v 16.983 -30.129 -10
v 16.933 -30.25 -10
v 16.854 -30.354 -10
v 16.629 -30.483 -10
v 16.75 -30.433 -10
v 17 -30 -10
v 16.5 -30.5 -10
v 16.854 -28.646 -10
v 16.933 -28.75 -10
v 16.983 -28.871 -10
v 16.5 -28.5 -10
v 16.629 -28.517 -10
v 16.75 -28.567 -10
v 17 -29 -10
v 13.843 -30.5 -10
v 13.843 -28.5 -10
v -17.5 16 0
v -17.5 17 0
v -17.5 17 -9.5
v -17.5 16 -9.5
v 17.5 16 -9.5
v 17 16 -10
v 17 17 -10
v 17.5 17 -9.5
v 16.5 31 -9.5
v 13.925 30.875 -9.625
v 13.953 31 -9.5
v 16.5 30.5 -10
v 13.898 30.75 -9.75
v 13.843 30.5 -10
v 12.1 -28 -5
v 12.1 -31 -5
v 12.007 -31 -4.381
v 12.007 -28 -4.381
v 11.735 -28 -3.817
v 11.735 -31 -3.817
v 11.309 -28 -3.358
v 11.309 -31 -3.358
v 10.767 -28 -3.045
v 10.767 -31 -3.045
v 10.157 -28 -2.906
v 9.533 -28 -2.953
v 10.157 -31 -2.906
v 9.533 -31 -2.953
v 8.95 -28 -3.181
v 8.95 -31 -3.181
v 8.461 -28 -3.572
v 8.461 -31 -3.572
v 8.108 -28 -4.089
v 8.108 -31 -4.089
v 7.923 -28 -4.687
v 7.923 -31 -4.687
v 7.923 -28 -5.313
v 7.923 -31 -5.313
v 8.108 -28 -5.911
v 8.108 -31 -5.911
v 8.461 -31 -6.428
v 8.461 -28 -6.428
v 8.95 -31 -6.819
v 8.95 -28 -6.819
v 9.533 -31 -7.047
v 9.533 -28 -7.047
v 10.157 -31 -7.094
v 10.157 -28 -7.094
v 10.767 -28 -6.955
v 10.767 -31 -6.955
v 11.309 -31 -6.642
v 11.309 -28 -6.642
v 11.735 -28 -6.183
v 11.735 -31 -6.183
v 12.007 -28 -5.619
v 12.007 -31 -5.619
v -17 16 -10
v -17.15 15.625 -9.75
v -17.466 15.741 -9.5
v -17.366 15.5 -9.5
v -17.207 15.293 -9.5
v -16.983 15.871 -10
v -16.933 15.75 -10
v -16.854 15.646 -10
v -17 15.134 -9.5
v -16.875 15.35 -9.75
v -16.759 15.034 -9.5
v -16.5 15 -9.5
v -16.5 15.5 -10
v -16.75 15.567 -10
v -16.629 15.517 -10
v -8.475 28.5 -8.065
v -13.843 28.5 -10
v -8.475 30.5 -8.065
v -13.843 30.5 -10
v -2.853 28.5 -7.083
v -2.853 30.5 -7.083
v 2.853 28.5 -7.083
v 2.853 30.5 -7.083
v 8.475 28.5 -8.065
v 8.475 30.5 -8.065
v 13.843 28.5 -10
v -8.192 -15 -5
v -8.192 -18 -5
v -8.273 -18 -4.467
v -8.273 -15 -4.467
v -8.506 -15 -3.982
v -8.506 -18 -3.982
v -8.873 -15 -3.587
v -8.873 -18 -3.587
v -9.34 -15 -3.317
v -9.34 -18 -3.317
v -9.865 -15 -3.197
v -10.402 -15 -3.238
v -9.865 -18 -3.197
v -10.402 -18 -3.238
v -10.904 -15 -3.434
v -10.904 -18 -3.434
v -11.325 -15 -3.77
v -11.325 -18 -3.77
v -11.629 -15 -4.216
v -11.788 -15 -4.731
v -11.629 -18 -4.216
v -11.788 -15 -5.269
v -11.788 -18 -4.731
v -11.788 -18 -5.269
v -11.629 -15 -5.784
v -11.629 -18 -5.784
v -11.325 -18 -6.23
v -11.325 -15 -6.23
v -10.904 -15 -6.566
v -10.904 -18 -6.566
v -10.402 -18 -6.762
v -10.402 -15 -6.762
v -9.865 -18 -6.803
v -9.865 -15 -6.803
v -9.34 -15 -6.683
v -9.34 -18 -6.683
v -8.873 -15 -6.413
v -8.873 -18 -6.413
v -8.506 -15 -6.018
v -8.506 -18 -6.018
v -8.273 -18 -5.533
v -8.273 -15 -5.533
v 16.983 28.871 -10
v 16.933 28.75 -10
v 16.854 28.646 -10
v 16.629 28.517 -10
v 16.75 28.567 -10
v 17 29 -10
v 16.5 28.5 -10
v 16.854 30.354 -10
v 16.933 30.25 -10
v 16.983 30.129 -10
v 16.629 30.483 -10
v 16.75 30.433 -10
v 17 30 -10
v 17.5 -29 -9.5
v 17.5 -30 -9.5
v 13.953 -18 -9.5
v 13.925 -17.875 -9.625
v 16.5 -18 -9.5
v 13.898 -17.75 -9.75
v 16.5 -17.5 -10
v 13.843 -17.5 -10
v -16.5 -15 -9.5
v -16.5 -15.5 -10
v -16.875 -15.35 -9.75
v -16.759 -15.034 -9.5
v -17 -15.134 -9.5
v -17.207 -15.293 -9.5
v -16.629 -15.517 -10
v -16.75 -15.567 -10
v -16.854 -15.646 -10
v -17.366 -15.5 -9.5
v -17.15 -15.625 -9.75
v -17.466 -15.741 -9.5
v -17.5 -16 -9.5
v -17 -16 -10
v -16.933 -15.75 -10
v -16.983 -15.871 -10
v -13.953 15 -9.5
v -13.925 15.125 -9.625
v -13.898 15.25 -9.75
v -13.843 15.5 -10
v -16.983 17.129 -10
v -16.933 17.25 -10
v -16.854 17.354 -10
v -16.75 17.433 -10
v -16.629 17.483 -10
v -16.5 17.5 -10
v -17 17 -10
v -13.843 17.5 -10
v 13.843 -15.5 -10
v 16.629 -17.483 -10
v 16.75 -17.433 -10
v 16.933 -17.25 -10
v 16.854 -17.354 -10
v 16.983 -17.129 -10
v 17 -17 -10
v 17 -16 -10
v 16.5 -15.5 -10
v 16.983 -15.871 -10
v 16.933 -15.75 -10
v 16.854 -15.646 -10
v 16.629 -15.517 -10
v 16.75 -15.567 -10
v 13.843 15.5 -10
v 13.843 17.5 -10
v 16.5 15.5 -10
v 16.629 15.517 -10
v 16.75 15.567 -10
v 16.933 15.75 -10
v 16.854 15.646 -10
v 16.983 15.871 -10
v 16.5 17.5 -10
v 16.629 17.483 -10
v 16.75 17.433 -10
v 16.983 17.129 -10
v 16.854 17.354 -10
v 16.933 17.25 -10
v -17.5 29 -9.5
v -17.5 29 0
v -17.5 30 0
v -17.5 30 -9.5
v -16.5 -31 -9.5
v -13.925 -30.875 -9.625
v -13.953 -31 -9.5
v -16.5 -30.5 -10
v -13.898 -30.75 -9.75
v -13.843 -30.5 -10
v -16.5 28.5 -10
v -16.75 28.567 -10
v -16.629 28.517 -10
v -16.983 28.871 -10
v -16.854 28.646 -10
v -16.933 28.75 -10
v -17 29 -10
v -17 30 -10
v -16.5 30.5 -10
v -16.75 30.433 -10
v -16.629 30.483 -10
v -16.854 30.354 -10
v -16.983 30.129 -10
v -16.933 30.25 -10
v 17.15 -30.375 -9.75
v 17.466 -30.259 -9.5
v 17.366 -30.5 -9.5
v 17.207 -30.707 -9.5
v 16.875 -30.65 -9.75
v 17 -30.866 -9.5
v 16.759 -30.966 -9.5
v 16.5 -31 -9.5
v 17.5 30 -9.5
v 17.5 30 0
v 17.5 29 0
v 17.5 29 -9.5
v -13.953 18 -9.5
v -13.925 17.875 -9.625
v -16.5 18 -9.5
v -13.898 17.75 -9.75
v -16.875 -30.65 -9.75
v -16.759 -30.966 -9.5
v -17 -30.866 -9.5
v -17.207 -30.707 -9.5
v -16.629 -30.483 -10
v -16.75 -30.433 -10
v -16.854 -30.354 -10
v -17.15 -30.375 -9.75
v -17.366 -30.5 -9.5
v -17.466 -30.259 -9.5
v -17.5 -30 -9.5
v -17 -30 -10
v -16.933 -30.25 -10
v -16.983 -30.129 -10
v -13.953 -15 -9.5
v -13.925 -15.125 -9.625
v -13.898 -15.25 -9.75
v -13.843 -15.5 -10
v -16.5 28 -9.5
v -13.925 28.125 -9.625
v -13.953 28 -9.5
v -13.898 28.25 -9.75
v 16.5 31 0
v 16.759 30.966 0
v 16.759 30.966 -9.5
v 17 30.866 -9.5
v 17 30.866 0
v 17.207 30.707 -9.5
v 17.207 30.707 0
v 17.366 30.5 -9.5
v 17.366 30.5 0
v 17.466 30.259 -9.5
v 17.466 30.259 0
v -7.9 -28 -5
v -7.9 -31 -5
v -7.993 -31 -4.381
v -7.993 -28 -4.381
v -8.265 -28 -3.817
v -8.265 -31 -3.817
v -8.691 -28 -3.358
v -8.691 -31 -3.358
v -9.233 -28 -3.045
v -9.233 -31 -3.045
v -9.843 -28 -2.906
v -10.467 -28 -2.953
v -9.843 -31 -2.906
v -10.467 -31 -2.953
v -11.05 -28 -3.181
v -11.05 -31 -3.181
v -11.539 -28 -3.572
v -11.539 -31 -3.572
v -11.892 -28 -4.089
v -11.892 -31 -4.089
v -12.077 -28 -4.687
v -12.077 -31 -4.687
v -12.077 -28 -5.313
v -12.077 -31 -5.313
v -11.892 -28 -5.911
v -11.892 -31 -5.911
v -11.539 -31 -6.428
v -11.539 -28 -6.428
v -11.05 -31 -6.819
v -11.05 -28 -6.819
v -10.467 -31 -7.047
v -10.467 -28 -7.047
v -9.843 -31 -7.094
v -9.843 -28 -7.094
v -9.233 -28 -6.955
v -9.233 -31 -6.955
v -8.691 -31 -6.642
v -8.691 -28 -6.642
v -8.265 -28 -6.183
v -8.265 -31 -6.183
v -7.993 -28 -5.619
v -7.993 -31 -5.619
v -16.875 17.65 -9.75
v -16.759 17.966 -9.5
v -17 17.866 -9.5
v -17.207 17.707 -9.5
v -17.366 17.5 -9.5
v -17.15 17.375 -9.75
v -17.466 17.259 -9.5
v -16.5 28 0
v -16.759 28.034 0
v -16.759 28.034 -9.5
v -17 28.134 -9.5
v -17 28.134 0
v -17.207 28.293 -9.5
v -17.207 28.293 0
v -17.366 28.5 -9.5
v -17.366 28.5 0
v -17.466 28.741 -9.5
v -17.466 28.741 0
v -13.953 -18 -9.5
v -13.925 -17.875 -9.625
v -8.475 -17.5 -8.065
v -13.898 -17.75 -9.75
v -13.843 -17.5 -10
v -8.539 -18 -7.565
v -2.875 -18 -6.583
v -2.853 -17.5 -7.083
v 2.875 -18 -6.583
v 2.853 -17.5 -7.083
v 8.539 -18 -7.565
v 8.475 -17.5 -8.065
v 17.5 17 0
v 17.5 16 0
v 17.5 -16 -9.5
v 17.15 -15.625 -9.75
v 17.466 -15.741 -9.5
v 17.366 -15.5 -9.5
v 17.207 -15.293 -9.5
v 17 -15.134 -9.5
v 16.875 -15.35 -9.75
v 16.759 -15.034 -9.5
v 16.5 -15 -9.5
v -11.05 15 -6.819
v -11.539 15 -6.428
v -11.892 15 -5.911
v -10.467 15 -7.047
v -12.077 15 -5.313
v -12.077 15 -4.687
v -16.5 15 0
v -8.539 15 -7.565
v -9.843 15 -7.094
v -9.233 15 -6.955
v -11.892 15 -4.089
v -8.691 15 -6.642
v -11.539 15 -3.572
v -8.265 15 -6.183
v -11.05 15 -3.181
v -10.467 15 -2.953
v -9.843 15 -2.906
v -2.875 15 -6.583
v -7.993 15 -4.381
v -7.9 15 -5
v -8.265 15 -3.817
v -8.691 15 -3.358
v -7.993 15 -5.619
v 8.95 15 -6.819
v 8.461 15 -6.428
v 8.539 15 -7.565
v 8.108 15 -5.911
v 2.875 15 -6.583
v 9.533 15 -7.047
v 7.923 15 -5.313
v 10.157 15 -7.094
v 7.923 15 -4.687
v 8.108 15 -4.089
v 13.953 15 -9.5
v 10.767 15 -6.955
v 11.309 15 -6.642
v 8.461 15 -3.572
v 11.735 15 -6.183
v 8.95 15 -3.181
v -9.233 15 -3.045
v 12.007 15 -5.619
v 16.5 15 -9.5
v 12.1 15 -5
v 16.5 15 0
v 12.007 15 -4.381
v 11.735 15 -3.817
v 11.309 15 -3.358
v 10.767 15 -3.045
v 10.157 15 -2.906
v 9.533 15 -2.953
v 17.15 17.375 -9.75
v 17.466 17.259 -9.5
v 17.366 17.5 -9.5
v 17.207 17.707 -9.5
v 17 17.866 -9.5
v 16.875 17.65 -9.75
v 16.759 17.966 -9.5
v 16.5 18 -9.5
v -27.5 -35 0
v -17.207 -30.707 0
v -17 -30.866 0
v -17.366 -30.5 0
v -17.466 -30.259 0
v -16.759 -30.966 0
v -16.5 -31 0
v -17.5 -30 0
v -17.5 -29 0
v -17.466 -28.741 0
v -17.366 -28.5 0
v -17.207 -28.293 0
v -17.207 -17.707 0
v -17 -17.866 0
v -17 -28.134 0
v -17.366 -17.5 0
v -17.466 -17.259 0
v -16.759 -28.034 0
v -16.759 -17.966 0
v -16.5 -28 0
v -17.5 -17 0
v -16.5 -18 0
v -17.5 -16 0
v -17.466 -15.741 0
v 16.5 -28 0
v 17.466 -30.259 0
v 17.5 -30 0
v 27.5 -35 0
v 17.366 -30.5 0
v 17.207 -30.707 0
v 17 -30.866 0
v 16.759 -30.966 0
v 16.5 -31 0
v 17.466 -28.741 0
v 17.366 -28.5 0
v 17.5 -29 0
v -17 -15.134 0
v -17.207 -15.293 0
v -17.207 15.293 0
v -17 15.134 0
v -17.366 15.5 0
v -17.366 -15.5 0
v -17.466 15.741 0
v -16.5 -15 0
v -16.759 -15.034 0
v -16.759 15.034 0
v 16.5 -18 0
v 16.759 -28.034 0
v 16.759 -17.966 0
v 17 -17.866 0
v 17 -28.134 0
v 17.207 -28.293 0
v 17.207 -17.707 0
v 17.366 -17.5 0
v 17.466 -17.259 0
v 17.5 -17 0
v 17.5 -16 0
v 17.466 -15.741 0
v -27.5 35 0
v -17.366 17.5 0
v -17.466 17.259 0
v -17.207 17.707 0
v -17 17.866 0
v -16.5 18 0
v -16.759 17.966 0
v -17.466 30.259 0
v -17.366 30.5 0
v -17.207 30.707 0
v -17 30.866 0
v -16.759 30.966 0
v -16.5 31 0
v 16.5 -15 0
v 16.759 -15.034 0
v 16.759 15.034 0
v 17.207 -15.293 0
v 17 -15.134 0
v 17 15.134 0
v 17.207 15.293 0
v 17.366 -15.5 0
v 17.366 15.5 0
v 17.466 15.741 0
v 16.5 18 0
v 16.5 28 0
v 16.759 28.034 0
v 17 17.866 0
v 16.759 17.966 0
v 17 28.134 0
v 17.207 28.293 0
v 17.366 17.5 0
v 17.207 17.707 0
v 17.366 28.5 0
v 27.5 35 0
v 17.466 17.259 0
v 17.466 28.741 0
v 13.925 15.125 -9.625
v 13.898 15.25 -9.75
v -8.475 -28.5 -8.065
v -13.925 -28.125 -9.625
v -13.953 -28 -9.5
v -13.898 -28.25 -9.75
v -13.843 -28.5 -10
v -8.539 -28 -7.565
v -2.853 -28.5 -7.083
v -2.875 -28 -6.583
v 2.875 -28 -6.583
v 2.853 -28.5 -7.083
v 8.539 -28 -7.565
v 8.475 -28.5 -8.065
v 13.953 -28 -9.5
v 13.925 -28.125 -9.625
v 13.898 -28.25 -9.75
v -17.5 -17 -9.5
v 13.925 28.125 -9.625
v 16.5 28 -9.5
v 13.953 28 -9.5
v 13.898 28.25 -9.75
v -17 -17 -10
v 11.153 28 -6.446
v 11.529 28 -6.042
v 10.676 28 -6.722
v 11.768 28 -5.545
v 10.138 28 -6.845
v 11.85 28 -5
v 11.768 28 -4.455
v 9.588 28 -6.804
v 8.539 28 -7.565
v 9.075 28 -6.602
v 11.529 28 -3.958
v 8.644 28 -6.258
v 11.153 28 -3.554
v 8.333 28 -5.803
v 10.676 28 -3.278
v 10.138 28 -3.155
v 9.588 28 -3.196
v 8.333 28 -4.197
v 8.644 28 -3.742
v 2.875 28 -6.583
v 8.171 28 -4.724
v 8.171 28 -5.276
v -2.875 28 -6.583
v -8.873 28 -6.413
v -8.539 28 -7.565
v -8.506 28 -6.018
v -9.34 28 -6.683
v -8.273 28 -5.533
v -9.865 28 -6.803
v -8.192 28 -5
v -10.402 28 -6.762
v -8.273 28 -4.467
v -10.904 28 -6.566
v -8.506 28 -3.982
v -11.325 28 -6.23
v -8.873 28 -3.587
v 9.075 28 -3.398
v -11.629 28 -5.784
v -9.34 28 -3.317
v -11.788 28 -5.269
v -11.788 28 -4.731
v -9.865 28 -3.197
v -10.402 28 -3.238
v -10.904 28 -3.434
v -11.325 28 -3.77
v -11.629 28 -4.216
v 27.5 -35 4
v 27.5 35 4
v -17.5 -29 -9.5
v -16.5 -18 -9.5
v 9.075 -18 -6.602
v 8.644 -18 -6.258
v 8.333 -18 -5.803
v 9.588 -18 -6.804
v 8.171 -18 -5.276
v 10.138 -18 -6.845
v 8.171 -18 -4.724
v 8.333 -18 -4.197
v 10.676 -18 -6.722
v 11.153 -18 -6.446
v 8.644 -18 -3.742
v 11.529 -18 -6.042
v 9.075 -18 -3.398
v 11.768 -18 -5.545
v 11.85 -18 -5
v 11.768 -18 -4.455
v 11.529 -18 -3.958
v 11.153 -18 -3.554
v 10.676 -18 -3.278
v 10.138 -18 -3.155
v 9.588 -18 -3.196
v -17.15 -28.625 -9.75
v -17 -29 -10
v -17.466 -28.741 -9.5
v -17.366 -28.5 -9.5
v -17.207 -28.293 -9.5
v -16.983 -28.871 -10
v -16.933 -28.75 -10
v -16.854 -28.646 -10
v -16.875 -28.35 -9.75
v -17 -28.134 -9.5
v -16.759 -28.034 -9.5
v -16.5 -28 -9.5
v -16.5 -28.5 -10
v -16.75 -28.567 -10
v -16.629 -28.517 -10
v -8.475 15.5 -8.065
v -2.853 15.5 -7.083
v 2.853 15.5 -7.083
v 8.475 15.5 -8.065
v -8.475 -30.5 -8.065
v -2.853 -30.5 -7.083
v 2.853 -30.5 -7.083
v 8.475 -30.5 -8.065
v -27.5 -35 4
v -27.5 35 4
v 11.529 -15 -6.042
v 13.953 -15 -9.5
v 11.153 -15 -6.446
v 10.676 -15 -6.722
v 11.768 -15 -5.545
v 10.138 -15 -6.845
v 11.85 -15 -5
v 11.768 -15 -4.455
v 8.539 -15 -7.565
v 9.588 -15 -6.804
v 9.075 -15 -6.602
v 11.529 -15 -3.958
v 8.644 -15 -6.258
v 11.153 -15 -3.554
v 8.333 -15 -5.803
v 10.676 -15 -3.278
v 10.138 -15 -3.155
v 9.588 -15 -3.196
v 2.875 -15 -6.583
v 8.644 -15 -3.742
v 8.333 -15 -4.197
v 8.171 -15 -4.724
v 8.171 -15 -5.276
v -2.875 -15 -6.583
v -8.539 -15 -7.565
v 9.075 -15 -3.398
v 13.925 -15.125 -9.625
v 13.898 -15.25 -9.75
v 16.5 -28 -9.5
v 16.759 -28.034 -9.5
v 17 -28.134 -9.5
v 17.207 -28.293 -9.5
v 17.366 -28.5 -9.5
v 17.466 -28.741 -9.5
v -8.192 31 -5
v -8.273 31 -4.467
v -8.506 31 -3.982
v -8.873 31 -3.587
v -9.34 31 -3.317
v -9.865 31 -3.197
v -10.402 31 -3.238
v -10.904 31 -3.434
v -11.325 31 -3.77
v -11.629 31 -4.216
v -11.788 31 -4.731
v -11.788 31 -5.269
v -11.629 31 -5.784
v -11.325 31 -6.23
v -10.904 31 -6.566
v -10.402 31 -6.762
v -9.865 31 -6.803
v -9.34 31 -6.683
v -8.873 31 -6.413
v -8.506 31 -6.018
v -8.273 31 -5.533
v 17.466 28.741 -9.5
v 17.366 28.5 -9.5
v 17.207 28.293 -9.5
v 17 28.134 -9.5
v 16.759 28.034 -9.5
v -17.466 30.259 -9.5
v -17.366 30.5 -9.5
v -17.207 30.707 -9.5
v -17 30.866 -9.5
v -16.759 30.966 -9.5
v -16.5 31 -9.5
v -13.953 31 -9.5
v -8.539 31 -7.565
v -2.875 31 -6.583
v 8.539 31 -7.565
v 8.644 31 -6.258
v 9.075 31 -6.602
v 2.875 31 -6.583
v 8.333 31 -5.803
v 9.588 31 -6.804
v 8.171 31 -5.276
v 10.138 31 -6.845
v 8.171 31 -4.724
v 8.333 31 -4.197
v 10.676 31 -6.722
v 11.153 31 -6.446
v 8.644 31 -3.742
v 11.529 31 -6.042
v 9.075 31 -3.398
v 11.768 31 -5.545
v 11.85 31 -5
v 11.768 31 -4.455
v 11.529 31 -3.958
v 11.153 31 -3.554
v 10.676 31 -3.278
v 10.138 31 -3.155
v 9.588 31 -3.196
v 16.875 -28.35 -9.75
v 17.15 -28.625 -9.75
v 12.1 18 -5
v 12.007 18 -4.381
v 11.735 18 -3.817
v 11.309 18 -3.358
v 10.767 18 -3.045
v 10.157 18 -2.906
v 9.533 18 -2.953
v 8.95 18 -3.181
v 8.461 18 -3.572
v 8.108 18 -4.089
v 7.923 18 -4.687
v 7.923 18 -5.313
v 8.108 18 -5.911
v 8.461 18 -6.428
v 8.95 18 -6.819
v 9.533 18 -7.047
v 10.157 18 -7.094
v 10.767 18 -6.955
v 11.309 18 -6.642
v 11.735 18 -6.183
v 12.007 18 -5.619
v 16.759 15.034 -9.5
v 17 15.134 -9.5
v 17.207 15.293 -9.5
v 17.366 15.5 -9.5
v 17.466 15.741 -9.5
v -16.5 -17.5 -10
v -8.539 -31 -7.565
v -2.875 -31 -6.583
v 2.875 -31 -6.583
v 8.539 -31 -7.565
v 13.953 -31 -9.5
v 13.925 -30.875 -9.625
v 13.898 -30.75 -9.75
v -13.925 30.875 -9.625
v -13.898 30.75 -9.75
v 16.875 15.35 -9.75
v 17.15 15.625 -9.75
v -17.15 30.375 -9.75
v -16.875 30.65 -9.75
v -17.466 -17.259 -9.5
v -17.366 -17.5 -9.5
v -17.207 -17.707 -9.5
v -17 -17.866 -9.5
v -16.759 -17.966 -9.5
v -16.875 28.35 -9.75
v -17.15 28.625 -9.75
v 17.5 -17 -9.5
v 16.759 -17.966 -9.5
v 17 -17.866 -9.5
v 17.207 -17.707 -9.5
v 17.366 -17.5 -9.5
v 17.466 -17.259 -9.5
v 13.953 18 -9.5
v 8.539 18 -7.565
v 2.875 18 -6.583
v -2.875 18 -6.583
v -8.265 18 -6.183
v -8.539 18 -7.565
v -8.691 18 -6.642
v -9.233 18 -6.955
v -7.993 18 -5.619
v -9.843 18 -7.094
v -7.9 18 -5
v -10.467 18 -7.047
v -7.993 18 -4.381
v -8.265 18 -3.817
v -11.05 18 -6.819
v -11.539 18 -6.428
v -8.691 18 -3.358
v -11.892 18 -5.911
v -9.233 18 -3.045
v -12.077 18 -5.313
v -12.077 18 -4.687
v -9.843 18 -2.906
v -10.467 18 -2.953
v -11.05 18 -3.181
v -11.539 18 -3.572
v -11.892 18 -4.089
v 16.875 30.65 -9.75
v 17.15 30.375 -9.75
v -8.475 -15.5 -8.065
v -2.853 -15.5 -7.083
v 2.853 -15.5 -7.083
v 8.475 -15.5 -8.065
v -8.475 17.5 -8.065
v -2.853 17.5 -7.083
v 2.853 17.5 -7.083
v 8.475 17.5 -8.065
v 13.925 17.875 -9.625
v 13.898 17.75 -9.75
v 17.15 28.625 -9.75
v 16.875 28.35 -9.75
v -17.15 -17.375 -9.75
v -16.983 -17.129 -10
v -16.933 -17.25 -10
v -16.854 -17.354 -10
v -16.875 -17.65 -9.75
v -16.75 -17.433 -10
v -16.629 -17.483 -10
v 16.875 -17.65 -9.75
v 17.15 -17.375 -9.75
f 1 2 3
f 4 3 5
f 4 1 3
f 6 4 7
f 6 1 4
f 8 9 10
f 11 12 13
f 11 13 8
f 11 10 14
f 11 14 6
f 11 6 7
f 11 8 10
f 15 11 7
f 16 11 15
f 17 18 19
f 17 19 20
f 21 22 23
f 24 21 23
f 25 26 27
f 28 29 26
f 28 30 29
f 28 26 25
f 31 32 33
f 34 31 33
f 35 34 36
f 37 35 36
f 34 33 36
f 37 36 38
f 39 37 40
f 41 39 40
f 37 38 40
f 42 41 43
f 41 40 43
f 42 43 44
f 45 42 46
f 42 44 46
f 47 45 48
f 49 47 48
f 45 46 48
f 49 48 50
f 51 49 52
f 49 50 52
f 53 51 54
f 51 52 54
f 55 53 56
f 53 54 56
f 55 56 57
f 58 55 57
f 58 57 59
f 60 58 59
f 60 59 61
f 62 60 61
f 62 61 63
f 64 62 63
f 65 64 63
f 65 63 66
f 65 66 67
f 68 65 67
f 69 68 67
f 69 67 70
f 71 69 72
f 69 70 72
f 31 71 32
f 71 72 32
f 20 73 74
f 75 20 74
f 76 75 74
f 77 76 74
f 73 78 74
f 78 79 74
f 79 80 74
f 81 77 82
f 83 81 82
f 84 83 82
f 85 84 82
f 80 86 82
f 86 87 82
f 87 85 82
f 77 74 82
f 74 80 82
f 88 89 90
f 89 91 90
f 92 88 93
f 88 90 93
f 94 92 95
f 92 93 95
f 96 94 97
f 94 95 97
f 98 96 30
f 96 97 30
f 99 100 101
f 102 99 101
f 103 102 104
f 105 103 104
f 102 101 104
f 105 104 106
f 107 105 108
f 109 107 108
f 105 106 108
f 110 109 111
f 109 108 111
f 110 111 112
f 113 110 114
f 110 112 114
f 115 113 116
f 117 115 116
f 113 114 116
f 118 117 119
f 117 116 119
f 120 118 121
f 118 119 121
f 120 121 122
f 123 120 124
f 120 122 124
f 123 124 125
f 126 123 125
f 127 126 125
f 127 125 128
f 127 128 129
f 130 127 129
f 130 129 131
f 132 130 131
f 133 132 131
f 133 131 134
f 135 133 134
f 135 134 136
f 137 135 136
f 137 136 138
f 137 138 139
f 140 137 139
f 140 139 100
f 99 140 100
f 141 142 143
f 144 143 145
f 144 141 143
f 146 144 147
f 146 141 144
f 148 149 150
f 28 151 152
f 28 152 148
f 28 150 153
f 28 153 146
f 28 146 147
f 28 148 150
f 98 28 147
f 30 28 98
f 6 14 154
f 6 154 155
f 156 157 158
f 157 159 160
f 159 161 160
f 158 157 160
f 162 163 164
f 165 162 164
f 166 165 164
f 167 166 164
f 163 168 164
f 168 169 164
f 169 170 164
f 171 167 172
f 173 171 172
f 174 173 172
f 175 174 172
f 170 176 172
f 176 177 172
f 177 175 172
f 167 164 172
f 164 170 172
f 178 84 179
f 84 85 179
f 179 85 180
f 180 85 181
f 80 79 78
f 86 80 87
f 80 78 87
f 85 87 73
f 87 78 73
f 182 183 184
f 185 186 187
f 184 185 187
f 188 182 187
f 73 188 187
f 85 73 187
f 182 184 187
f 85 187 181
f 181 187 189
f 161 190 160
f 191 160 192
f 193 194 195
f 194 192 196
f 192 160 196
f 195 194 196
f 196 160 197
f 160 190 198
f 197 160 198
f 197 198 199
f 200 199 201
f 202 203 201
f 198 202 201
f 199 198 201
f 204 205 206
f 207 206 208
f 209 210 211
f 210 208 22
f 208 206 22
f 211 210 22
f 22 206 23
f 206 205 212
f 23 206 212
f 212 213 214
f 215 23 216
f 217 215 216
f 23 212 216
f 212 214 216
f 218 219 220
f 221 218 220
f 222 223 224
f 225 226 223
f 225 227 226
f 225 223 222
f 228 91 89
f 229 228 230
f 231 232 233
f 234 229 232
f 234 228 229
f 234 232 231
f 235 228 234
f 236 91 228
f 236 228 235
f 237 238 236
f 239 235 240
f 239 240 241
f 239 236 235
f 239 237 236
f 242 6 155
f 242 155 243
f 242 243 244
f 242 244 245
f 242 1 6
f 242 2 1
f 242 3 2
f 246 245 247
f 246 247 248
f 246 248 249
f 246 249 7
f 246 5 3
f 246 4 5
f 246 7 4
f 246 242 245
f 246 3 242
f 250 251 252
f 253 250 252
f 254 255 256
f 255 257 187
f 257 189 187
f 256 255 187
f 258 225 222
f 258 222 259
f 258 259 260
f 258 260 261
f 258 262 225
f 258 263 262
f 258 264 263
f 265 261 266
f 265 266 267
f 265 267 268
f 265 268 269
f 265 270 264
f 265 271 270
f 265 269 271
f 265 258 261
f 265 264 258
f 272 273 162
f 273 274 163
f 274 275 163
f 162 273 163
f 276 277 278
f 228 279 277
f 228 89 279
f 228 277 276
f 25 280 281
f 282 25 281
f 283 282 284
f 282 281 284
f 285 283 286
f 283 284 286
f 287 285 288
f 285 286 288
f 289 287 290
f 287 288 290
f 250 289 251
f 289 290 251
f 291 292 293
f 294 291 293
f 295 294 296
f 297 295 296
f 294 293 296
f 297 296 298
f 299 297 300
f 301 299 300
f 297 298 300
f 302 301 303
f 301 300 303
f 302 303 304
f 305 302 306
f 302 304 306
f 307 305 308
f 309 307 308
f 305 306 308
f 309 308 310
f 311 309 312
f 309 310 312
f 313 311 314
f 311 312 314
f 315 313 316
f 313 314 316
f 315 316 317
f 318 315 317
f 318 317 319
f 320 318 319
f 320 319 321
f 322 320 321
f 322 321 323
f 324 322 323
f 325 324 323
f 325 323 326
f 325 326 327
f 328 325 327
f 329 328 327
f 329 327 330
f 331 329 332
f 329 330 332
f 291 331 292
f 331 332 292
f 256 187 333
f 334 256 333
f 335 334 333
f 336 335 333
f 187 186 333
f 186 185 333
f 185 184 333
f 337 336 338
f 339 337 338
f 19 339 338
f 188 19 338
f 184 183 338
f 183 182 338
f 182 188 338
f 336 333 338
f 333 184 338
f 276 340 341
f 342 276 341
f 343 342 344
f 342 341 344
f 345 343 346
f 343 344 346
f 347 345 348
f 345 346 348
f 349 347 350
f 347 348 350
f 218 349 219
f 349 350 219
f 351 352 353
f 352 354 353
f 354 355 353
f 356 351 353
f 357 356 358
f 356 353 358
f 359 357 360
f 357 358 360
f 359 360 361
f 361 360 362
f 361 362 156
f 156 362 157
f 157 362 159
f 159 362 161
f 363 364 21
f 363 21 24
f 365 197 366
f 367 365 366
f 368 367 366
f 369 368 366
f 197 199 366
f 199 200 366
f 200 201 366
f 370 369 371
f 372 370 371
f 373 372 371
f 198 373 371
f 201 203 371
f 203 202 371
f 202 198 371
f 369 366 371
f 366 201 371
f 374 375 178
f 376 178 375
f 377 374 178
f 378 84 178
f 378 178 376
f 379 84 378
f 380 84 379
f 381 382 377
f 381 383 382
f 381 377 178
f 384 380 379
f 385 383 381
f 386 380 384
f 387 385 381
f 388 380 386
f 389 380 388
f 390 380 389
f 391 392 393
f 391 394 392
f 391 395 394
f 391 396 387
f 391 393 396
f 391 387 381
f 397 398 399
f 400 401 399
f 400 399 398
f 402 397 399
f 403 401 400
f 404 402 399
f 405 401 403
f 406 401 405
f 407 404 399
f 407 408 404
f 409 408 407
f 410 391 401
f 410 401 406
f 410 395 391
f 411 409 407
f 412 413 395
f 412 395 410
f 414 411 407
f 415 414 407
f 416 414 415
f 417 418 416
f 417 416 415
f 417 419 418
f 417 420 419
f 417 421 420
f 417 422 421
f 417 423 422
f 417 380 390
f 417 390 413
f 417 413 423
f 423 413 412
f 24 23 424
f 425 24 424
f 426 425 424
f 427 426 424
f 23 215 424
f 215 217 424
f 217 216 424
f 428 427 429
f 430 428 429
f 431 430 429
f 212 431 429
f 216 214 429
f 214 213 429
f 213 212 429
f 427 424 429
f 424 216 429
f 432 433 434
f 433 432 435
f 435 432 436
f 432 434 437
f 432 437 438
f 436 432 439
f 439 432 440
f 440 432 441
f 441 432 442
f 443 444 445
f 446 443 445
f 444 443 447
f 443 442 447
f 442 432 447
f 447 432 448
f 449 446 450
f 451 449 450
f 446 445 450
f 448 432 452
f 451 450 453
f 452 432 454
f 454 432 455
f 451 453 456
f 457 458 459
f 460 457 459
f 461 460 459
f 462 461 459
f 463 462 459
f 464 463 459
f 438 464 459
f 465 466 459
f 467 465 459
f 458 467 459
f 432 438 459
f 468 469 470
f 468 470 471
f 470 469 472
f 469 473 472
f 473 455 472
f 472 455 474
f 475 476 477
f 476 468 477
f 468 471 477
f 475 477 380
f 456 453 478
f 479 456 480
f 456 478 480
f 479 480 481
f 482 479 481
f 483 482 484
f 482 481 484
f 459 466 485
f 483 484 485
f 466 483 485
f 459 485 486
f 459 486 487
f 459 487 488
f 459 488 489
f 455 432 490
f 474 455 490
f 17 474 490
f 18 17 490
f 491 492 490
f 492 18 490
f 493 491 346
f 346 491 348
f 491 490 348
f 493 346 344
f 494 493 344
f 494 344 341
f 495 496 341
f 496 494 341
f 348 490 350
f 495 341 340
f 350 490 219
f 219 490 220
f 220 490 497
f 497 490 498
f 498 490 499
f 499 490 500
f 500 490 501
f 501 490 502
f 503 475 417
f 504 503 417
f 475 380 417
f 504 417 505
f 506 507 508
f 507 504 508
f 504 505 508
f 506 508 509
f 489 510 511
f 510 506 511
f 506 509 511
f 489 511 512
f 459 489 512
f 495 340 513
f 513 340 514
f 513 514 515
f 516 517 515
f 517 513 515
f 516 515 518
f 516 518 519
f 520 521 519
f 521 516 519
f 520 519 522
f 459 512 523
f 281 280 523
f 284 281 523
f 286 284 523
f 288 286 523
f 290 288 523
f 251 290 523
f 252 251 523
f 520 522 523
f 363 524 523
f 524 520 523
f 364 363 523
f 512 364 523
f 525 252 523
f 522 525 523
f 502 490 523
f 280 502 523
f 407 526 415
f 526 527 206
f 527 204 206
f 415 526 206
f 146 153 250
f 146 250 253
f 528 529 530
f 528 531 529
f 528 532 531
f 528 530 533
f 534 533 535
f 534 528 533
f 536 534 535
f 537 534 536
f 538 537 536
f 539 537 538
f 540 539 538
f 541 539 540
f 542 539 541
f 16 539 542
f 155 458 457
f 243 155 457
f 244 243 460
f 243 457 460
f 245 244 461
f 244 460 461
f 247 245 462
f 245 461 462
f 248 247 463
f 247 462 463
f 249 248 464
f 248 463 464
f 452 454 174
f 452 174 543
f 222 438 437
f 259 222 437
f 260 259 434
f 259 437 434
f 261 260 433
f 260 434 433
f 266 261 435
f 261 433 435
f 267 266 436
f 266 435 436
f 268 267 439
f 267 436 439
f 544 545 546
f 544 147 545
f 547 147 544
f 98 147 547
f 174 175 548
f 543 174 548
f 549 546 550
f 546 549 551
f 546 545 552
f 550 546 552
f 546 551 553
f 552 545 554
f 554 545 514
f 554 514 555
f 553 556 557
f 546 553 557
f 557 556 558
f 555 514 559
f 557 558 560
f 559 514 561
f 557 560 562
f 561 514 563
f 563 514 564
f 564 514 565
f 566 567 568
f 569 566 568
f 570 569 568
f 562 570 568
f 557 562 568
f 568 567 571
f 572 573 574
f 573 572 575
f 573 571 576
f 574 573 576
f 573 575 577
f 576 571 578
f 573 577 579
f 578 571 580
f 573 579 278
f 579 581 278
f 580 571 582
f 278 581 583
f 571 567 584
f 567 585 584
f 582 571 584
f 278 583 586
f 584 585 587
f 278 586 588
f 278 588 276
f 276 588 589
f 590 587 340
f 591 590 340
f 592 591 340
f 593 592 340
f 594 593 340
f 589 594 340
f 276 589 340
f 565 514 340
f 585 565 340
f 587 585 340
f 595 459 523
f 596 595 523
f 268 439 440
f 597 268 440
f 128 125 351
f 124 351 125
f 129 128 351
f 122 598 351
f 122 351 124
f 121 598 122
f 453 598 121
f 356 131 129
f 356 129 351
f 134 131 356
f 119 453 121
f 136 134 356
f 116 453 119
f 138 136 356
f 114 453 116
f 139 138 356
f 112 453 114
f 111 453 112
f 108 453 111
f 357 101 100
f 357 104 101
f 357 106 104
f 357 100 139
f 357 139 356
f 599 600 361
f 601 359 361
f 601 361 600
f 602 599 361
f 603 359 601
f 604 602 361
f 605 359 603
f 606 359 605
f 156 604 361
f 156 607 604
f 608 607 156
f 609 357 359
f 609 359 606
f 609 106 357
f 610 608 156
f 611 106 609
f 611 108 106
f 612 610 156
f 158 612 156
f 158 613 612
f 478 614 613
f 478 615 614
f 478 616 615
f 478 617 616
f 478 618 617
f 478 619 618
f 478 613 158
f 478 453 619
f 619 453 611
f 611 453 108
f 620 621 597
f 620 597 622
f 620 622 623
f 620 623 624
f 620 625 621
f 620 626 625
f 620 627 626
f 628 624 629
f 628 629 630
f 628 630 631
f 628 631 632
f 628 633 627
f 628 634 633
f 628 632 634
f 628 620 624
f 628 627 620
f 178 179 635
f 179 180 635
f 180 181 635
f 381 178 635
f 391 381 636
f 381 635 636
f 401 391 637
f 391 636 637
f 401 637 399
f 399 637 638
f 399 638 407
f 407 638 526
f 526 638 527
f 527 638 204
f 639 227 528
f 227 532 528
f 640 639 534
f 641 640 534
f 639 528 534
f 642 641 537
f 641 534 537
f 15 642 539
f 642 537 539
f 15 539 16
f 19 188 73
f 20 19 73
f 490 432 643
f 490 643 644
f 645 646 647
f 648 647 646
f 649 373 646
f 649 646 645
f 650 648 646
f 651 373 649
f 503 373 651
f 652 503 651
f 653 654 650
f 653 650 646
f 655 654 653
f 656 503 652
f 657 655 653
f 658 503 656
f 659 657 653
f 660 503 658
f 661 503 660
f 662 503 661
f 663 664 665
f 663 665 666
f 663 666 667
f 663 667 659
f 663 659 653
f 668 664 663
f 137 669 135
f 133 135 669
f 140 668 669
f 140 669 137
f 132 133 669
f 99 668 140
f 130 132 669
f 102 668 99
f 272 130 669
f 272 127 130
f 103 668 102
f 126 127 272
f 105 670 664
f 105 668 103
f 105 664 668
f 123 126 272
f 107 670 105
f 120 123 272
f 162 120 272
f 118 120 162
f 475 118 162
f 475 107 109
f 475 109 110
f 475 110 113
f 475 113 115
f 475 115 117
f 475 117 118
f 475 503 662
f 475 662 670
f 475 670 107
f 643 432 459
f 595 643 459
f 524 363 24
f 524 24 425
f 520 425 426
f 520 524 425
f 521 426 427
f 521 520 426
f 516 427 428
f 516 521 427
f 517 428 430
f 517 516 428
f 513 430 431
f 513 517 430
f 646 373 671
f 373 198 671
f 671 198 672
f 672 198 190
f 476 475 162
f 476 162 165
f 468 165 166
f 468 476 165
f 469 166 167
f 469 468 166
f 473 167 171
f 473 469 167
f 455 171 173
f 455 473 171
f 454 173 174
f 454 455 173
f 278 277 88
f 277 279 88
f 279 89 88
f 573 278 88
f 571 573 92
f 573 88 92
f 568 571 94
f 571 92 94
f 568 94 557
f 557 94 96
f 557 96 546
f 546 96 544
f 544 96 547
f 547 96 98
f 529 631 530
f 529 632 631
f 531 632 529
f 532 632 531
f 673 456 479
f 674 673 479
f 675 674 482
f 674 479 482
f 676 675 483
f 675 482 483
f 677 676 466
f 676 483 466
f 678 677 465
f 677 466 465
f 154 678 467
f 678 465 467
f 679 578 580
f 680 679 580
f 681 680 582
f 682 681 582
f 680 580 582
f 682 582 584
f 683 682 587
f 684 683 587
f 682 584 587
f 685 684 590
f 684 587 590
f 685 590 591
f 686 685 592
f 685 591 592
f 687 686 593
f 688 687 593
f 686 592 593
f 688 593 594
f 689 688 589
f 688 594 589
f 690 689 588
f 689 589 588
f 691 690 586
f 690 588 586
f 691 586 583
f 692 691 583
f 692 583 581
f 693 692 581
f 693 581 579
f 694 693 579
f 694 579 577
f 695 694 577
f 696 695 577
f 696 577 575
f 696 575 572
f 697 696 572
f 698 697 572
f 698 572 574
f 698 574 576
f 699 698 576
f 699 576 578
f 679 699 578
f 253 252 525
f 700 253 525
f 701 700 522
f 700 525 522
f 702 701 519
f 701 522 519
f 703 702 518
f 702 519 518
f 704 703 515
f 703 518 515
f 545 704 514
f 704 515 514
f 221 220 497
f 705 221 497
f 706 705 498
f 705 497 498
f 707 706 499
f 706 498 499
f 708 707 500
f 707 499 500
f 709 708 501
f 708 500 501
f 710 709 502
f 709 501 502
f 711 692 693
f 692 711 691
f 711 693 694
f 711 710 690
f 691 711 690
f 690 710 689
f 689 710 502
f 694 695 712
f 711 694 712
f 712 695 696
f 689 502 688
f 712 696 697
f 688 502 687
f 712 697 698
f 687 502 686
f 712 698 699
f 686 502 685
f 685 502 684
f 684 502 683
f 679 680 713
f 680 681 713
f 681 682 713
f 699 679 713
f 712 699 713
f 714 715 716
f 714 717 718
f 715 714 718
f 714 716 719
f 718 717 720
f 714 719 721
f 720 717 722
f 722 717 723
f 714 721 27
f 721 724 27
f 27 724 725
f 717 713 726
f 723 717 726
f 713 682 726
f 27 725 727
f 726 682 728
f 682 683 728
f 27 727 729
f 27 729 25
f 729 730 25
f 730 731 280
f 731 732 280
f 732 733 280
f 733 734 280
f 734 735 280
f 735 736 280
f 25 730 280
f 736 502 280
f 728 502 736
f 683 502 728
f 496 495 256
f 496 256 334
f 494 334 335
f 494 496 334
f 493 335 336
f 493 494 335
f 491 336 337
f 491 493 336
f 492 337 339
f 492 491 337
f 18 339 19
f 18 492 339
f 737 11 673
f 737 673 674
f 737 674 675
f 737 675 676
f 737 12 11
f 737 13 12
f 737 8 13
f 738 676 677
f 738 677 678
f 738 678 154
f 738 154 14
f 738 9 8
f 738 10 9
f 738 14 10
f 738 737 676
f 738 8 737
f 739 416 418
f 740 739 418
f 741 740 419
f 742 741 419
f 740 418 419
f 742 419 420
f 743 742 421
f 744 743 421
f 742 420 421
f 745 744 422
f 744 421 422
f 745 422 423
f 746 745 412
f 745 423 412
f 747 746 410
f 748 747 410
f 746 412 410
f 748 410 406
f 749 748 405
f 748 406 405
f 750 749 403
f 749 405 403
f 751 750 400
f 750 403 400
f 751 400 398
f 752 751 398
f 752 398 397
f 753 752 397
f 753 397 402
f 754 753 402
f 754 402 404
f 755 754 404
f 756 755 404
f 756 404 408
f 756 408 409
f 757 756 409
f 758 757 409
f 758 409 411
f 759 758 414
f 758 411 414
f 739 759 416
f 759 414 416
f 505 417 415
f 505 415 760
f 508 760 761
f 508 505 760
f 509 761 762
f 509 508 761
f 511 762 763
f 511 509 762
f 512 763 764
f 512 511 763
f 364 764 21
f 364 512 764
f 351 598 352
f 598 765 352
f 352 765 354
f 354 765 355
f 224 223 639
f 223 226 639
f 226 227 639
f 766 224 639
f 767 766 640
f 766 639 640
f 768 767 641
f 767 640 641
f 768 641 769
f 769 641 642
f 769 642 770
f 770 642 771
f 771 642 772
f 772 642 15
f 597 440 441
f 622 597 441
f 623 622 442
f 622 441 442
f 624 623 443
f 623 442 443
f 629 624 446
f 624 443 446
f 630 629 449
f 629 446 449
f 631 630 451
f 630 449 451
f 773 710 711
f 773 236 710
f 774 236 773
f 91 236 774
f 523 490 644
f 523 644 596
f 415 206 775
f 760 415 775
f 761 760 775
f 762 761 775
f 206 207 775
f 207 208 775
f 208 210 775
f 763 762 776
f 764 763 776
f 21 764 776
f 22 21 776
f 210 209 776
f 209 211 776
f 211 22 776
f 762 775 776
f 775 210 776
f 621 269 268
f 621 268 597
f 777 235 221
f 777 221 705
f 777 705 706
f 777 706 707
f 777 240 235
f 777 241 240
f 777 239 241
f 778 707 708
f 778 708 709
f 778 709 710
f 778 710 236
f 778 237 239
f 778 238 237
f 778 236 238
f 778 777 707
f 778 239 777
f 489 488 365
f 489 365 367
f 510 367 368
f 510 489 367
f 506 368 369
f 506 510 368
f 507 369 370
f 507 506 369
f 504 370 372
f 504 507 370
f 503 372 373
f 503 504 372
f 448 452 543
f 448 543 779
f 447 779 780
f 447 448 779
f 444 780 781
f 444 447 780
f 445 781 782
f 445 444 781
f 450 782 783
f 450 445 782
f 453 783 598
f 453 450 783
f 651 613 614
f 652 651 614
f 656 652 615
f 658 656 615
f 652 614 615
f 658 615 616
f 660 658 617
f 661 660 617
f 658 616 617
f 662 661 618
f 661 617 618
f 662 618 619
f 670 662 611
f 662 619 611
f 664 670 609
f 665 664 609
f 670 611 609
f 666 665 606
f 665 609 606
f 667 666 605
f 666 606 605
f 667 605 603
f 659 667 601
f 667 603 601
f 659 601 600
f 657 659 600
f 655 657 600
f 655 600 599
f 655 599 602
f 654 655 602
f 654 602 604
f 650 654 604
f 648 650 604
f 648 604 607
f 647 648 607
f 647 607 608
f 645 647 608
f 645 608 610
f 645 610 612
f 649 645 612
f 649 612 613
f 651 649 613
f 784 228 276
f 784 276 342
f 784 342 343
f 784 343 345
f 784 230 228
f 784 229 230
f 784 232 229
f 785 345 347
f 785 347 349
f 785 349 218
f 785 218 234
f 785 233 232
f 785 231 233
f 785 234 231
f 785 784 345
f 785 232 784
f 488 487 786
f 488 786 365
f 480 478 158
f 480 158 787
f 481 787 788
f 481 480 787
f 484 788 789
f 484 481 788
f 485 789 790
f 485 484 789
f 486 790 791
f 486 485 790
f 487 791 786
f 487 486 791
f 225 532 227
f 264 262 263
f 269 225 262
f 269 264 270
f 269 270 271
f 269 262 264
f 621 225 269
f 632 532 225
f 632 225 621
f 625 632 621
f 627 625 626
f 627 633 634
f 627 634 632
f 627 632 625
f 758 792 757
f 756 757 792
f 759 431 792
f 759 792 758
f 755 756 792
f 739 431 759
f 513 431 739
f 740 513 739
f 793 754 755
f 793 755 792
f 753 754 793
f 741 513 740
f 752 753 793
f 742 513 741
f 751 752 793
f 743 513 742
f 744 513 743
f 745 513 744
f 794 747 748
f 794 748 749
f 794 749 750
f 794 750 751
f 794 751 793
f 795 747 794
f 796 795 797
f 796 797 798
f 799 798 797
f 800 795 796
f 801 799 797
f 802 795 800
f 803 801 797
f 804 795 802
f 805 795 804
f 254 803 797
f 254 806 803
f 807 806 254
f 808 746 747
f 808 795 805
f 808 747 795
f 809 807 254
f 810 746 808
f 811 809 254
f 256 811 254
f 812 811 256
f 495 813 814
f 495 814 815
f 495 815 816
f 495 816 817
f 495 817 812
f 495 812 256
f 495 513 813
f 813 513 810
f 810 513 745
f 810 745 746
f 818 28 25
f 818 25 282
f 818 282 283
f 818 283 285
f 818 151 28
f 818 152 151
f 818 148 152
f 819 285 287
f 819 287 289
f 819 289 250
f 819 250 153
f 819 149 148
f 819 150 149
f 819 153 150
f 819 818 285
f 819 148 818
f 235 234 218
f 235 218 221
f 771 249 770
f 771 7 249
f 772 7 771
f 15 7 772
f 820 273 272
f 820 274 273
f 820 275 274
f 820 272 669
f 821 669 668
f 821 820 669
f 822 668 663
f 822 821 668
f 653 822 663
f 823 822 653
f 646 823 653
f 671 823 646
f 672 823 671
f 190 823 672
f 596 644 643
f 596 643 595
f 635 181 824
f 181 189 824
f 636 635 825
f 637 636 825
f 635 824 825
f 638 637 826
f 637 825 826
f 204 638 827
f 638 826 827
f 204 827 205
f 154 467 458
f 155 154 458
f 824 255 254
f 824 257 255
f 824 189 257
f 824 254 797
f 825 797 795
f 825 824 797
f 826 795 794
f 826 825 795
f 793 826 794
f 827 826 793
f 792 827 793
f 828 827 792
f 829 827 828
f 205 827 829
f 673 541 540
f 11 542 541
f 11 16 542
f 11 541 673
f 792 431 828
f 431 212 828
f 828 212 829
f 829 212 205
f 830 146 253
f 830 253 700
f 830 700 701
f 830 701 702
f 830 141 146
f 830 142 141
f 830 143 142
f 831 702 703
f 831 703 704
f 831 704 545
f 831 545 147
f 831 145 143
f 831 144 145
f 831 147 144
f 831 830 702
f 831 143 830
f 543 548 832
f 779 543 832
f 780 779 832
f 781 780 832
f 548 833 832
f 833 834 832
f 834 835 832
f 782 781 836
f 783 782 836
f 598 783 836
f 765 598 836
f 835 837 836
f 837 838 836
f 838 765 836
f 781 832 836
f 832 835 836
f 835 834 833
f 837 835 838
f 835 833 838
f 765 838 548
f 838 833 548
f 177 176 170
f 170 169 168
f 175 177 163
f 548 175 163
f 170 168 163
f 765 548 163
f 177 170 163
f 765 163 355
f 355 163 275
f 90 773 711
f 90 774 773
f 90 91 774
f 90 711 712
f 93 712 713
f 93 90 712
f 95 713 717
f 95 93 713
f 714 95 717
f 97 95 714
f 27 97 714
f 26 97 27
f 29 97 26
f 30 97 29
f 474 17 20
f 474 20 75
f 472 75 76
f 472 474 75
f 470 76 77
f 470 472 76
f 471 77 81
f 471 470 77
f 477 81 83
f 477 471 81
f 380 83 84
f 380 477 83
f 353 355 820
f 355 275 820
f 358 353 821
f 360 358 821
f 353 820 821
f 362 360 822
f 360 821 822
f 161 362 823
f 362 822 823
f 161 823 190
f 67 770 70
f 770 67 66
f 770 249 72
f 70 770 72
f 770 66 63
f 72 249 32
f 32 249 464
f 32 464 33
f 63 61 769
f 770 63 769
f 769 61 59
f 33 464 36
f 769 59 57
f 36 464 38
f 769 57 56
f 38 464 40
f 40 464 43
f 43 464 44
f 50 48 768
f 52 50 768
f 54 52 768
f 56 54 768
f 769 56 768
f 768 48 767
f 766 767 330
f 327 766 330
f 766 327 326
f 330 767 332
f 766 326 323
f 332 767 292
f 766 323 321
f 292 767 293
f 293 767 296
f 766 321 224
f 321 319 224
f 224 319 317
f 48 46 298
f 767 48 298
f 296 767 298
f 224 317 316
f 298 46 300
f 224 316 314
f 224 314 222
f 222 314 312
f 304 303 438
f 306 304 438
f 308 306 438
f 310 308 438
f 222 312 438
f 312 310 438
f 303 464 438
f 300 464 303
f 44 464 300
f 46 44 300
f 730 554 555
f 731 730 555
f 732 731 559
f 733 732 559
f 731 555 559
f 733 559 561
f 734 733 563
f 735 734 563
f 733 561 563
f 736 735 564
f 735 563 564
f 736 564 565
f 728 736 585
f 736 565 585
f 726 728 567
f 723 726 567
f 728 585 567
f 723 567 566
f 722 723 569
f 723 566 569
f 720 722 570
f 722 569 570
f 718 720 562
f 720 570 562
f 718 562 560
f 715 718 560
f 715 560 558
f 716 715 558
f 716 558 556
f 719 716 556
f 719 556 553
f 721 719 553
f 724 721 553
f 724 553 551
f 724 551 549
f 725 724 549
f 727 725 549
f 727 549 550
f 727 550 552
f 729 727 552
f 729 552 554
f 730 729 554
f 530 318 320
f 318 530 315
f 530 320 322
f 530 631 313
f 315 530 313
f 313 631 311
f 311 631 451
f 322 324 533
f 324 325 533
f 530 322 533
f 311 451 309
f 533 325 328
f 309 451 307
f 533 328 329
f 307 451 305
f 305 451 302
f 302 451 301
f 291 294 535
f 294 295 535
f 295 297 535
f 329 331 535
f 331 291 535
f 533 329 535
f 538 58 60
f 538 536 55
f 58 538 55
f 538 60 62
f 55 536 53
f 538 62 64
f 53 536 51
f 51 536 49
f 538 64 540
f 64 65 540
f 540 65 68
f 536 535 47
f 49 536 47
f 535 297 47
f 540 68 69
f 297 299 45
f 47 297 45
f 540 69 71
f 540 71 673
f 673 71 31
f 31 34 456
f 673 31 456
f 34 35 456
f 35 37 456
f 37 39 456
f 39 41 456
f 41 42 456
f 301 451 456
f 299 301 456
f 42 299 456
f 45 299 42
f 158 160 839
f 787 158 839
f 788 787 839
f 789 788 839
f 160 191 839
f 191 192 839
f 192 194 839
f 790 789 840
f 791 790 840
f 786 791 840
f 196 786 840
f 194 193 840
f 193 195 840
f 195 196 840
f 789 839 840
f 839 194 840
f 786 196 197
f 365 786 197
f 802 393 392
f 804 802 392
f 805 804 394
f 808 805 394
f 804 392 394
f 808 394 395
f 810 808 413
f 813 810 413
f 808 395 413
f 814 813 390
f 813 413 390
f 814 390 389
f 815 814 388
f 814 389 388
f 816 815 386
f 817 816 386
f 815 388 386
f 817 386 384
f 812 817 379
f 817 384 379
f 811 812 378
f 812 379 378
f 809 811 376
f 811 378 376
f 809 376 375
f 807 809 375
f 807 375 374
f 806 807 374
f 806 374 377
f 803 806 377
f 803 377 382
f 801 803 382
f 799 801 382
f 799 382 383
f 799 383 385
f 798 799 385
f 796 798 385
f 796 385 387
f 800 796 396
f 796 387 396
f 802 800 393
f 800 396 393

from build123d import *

# Parameters (mm, degrees)
SKETCH1_W               = 55
SKETCH1_H               = 70
BOSS_EXTRUDE1_DEPTH     = 4
BOSS_EXTRUDE2_DEPTH     = 10
SKETCH3_R               = 1.807722862
SKETCH3_R_2             = 1.85
CUT_EXTRUDE1_DEPTH      = 5
CUT_EXTRUDE1_DEPTH_BACK = 67
SKETCH4_R               = 2.1
CUT_EXTRUDE2_DEPTH      = 5
CUT_EXTRUDE2_DEPTH_BACK = 3
CUT_EXTRUDE3_START      = -46
SKETCH4_2_R             = 2.1
CUT_EXTRUDE3_DEPTH      = 3
CHAMFER1_SIZE           = 0.5
SKETCH5_R               = 33.04
CUT_EXTRUDE4_DEPTH      = 62
CHAMFER2_SIZE           = 0.5


with BuildPart() as part:
    # Sketch1 → Boss-Extrude1 (new body)
    with BuildSketch(Plane.XY):
        Rectangle(SKETCH1_W, SKETCH1_H)
    extrude(amount=BOSS_EXTRUDE1_DEPTH)

    # Sketch2 → Boss-Extrude2 (add)
    with BuildSketch(Plane(origin=(0, 0, 0), x_dir=(-1, 0, 0), z_dir=(0, 0, -1))):
        with BuildLine():
            Line((-16.5, 28), (16.5, 28))
            ThreePointArc((16.5, 28), (17.207106781, 28.292893219), (17.5, 29))
            Line((17.5, 29), (17.5, 30))
            ThreePointArc((17.5, 30), (17.207106781, 30.707106781), (16.5, 31))
            Line((16.5, 31), (-16.5, 31))
            ThreePointArc((-16.5, 31), (-17.207106781, 30.707106781), (-17.5, 30))
            Line((-17.5, 30), (-17.5, 29))
            ThreePointArc((-17.5, 29), (-17.207106781, 28.292893219), (-16.5, 28))
        make_face()
        with BuildLine():
            Line((-16.5, 18), (16.5, 18))
            ThreePointArc((16.5, 18), (17.207106781, 17.707106781), (17.5, 17))
            Line((17.5, 17), (17.5, 16))
            ThreePointArc((17.5, 16), (17.207106781, 15.292893219), (16.5, 15))
            Line((16.5, 15), (-16.5, 15))
            ThreePointArc((-16.5, 15), (-17.207106781, 15.292893219), (-17.5, 16))
            Line((-17.5, 16), (-17.5, 17))
            ThreePointArc((-17.5, 17), (-17.207106781, 17.707106781), (-16.5, 18))
        make_face()
        with BuildLine():
            Line((-16.5, -31), (16.5, -31))
            ThreePointArc((16.5, -31), (17.207106781, -30.707106781), (17.5, -30))
            Line((17.5, -30), (17.5, -29))
            ThreePointArc((17.5, -29), (17.207106781, -28.292893219), (16.5, -28))
            Line((16.5, -28), (-16.5, -28))
            ThreePointArc((-16.5, -28), (-17.207106781, -28.292893219), (-17.5, -29))
            Line((-17.5, -29), (-17.5, -30))
            ThreePointArc((-17.5, -30), (-17.207106781, -30.707106781), (-16.5, -31))
        make_face()
        with BuildLine():
            Line((-16.5, -15), (16.5, -15))
            ThreePointArc((16.5, -15), (17.207106781, -15.292893219), (17.5, -16))
            Line((17.5, -16), (17.5, -17))
            ThreePointArc((17.5, -17), (17.207106781, -17.707106781), (16.5, -18))
            Line((16.5, -18), (-16.5, -18))
            ThreePointArc((-16.5, -18), (-17.207106781, -17.707106781), (-17.5, -17))
            Line((-17.5, -17), (-17.5, -16))
            ThreePointArc((-17.5, -16), (-17.207106781, -15.292893219), (-16.5, -15))
        make_face()
    extrude(amount=BOSS_EXTRUDE2_DEPTH)

    # Sketch3 → Cut-Extrude1 (cut, two sides)
    with BuildSketch(Plane.XZ.offset(31)) as cut_extrude1_sk:
        with Locations((-10, -5)):
            Circle(SKETCH3_R)
        with Locations((10, -5)):
            Circle(SKETCH3_R_2)
    extrude(amount=CUT_EXTRUDE1_DEPTH, mode=Mode.SUBTRACT)
    extrude(cut_extrude1_sk.sketch, amount=-CUT_EXTRUDE1_DEPTH_BACK, mode=Mode.SUBTRACT)

    # Sketch4 → Cut-Extrude2 (cut, two sides)
    with BuildSketch(Plane.XZ.offset(31)) as cut_extrude2_sk:
        with Locations((10, -5)):
            Circle(SKETCH4_R)
        with Locations((-10, -5)):
            Circle(SKETCH4_R)
    extrude(amount=CUT_EXTRUDE2_DEPTH, mode=Mode.SUBTRACT)
    extrude(cut_extrude2_sk.sketch, amount=-CUT_EXTRUDE2_DEPTH_BACK, mode=Mode.SUBTRACT)

    # Sketch4<2> → Cut-Extrude3 (cut)
    with BuildSketch(Plane.XZ.offset(31).offset(CUT_EXTRUDE3_START)):
        with Locations((10, -5)):
            Circle(SKETCH4_2_R)
        with Locations((-10, -5)):
            Circle(SKETCH4_2_R)
    extrude(amount=-CUT_EXTRUDE3_DEPTH, mode=Mode.SUBTRACT)

    # Chamfer1
    chamfer1_edges = [part.edges().sort_by_distance(p)[0] for p in [
        (17.207106781, 17.707106781, -10),
        (17.5, 16.5, -10),
        (17.207106781, 15.292893219, -10),
        (0, 15, -10),
        (-17.207106781, 15.292893219, -10),
        (-17.5, 16.5, -10),
        (-17.207106781, 17.707106781, -10),
        (0, 18, -10),
        (-17.207106781, 30.707106781, -10),
        (0, 31, -10),
        (17.207106781, 30.707106781, -10),
        (17.5, 29.5, -10),
        (17.207106781, 28.292893219, -10),
        (0, 28, -10),
        (-17.207106781, 28.292893219, -10),
        (-17.5, 29.5, -10),
        (-17.207106781, -30.707106781, -10),
        (-17.5, -29.5, -10),
        (-17.207106781, -28.292893219, -10),
        (0, -28, -10),
        (17.207106781, -28.292893219, -10),
        (17.5, -29.5, -10),
        (17.207106781, -30.707106781, -10),
        (0, -31, -10),
        (-17.207106781, -15.292893219, -10),
        (0, -15, -10),
        (17.207106781, -15.292893219, -10),
        (17.5, -16.5, -10),
        (17.207106781, -17.707106781, -10),
        (0, -18, -10),
        (-17.207106781, -17.707106781, -10),
        (-17.5, -16.5, -10),
    ]]
    chamfer(chamfer1_edges, length=CHAMFER1_SIZE)

    # Sketch5 → Cut-Extrude4 (cut)
    with BuildSketch(Plane(origin=(0, 31, 0), x_dir=(1, 0, 0), z_dir=(0, 1, 0))):
        with Locations((0, 40)):
            Circle(SKETCH5_R)
    extrude(amount=-CUT_EXTRUDE4_DEPTH, mode=Mode.SUBTRACT)

    # Chamfer2
    chamfer2_edges = [part.edges().sort_by_distance(p)[0] for p in [
        (0, -31, -6.96),
        (0, -28, -6.96),
        (0, -18, -6.96),
        (0, -15, -6.96),
        (0, 15, -6.96),
        (0, 18, -6.96),
        (0, 28, -6.96),
        (0, 31, -6.96),
    ]]
    chamfer(chamfer2_edges, length=CHAMFER2_SIZE)


solid = part.part
